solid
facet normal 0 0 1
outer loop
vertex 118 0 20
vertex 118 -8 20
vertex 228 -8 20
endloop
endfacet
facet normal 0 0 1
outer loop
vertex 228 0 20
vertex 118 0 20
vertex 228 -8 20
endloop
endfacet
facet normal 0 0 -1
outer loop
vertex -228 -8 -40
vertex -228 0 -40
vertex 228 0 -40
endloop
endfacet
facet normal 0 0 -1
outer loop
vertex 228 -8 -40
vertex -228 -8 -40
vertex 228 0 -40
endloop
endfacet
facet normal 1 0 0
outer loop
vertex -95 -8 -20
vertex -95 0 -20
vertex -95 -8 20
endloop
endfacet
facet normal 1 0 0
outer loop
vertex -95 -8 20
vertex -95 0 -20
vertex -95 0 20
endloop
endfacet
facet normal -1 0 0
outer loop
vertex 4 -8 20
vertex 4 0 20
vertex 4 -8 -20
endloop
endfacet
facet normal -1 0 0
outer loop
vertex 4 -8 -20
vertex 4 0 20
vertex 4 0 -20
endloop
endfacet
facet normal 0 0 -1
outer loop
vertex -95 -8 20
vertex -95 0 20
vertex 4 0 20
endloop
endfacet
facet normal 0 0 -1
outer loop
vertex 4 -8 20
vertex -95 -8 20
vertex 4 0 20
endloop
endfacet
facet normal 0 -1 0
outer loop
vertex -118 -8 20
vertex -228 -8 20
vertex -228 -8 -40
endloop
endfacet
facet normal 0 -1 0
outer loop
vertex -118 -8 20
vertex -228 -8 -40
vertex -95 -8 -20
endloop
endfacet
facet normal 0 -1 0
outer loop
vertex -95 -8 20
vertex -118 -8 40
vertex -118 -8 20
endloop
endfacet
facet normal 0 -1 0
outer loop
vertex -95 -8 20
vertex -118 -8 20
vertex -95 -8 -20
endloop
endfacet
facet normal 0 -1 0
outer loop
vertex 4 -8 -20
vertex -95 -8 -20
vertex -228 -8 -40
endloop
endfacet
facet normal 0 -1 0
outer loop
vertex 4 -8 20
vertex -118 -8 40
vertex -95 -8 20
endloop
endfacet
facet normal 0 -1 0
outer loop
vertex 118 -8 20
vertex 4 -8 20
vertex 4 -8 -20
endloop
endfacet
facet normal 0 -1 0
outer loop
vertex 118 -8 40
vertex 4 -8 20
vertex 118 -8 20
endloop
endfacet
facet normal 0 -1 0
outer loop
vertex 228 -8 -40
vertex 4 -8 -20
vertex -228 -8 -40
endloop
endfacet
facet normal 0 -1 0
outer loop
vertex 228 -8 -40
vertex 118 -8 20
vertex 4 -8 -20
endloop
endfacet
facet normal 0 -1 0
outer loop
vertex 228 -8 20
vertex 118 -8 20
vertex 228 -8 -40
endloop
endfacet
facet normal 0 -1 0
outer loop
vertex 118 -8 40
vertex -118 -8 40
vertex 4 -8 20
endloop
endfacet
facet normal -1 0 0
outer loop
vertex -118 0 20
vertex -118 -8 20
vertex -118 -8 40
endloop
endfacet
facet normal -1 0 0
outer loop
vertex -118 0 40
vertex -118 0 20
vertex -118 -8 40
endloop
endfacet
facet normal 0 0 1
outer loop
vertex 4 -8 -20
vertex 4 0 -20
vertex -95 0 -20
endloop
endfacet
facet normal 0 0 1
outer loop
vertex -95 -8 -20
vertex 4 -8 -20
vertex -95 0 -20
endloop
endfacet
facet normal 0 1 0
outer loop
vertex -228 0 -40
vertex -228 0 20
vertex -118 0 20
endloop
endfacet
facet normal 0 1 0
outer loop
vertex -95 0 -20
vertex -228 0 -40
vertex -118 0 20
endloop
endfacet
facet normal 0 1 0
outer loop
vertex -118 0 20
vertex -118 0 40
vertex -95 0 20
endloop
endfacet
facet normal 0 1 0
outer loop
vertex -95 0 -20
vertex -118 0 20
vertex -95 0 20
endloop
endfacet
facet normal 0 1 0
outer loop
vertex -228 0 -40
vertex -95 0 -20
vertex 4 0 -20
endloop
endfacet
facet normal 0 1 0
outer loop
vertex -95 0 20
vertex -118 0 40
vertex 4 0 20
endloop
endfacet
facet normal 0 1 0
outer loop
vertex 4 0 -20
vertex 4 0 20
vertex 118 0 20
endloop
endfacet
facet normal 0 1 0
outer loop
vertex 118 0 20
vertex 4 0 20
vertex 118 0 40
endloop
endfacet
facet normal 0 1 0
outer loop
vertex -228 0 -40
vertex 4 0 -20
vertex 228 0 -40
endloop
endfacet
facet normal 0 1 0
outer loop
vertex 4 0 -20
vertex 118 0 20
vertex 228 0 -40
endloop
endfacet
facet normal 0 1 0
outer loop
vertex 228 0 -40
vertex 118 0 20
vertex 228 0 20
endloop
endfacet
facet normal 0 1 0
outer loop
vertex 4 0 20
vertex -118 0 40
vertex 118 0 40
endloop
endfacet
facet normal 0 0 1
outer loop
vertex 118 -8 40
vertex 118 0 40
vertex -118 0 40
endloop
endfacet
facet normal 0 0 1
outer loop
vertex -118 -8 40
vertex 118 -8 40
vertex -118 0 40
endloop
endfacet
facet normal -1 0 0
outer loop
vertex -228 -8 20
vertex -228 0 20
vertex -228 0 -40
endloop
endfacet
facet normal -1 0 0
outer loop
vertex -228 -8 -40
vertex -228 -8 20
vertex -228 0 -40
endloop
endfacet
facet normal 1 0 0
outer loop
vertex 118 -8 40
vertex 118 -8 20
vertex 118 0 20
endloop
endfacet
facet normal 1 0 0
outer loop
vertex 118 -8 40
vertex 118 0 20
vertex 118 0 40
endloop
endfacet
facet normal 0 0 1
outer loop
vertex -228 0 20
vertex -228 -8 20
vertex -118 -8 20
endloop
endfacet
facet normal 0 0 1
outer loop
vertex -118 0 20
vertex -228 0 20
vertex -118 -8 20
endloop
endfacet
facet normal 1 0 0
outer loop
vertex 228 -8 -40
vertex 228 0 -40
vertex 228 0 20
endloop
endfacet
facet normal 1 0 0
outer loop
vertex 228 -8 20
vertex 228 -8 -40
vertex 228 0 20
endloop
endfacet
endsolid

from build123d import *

# Parameters (mm, degrees)
F1_DEPTH = 8
F2_W     = 110
F2_H     = 20
F3_DEPTH = 25


with BuildPart() as f1:
    # F0 (on Front) → F1 (new body)
    with BuildSketch(Plane.XZ):
        Polygon((228, 40), (0, 40), (0, 20), (4, 20), (4, 0), (4, -20), (0, -20), (0, -40), (228, -40), align=None)
        Polygon((0, 20), (0, 40), (-228, 40), (-228, -40), (0, -40), (0, -20), (-95, -20), (-95, 20), align=None)
    extrude(amount=F1_DEPTH)

    # F2 (on face) → F3 (cut)
    with BuildSketch(Plane.XZ.offset(8)):
        with Locations((-173, 30)):
            Rectangle(F2_W, F2_H)
        with Locations((173, 30)):
            Rectangle(F2_W, F2_H)
    extrude(amount=-F3_DEPTH, mode=Mode.SUBTRACT)


solid = f1.part
